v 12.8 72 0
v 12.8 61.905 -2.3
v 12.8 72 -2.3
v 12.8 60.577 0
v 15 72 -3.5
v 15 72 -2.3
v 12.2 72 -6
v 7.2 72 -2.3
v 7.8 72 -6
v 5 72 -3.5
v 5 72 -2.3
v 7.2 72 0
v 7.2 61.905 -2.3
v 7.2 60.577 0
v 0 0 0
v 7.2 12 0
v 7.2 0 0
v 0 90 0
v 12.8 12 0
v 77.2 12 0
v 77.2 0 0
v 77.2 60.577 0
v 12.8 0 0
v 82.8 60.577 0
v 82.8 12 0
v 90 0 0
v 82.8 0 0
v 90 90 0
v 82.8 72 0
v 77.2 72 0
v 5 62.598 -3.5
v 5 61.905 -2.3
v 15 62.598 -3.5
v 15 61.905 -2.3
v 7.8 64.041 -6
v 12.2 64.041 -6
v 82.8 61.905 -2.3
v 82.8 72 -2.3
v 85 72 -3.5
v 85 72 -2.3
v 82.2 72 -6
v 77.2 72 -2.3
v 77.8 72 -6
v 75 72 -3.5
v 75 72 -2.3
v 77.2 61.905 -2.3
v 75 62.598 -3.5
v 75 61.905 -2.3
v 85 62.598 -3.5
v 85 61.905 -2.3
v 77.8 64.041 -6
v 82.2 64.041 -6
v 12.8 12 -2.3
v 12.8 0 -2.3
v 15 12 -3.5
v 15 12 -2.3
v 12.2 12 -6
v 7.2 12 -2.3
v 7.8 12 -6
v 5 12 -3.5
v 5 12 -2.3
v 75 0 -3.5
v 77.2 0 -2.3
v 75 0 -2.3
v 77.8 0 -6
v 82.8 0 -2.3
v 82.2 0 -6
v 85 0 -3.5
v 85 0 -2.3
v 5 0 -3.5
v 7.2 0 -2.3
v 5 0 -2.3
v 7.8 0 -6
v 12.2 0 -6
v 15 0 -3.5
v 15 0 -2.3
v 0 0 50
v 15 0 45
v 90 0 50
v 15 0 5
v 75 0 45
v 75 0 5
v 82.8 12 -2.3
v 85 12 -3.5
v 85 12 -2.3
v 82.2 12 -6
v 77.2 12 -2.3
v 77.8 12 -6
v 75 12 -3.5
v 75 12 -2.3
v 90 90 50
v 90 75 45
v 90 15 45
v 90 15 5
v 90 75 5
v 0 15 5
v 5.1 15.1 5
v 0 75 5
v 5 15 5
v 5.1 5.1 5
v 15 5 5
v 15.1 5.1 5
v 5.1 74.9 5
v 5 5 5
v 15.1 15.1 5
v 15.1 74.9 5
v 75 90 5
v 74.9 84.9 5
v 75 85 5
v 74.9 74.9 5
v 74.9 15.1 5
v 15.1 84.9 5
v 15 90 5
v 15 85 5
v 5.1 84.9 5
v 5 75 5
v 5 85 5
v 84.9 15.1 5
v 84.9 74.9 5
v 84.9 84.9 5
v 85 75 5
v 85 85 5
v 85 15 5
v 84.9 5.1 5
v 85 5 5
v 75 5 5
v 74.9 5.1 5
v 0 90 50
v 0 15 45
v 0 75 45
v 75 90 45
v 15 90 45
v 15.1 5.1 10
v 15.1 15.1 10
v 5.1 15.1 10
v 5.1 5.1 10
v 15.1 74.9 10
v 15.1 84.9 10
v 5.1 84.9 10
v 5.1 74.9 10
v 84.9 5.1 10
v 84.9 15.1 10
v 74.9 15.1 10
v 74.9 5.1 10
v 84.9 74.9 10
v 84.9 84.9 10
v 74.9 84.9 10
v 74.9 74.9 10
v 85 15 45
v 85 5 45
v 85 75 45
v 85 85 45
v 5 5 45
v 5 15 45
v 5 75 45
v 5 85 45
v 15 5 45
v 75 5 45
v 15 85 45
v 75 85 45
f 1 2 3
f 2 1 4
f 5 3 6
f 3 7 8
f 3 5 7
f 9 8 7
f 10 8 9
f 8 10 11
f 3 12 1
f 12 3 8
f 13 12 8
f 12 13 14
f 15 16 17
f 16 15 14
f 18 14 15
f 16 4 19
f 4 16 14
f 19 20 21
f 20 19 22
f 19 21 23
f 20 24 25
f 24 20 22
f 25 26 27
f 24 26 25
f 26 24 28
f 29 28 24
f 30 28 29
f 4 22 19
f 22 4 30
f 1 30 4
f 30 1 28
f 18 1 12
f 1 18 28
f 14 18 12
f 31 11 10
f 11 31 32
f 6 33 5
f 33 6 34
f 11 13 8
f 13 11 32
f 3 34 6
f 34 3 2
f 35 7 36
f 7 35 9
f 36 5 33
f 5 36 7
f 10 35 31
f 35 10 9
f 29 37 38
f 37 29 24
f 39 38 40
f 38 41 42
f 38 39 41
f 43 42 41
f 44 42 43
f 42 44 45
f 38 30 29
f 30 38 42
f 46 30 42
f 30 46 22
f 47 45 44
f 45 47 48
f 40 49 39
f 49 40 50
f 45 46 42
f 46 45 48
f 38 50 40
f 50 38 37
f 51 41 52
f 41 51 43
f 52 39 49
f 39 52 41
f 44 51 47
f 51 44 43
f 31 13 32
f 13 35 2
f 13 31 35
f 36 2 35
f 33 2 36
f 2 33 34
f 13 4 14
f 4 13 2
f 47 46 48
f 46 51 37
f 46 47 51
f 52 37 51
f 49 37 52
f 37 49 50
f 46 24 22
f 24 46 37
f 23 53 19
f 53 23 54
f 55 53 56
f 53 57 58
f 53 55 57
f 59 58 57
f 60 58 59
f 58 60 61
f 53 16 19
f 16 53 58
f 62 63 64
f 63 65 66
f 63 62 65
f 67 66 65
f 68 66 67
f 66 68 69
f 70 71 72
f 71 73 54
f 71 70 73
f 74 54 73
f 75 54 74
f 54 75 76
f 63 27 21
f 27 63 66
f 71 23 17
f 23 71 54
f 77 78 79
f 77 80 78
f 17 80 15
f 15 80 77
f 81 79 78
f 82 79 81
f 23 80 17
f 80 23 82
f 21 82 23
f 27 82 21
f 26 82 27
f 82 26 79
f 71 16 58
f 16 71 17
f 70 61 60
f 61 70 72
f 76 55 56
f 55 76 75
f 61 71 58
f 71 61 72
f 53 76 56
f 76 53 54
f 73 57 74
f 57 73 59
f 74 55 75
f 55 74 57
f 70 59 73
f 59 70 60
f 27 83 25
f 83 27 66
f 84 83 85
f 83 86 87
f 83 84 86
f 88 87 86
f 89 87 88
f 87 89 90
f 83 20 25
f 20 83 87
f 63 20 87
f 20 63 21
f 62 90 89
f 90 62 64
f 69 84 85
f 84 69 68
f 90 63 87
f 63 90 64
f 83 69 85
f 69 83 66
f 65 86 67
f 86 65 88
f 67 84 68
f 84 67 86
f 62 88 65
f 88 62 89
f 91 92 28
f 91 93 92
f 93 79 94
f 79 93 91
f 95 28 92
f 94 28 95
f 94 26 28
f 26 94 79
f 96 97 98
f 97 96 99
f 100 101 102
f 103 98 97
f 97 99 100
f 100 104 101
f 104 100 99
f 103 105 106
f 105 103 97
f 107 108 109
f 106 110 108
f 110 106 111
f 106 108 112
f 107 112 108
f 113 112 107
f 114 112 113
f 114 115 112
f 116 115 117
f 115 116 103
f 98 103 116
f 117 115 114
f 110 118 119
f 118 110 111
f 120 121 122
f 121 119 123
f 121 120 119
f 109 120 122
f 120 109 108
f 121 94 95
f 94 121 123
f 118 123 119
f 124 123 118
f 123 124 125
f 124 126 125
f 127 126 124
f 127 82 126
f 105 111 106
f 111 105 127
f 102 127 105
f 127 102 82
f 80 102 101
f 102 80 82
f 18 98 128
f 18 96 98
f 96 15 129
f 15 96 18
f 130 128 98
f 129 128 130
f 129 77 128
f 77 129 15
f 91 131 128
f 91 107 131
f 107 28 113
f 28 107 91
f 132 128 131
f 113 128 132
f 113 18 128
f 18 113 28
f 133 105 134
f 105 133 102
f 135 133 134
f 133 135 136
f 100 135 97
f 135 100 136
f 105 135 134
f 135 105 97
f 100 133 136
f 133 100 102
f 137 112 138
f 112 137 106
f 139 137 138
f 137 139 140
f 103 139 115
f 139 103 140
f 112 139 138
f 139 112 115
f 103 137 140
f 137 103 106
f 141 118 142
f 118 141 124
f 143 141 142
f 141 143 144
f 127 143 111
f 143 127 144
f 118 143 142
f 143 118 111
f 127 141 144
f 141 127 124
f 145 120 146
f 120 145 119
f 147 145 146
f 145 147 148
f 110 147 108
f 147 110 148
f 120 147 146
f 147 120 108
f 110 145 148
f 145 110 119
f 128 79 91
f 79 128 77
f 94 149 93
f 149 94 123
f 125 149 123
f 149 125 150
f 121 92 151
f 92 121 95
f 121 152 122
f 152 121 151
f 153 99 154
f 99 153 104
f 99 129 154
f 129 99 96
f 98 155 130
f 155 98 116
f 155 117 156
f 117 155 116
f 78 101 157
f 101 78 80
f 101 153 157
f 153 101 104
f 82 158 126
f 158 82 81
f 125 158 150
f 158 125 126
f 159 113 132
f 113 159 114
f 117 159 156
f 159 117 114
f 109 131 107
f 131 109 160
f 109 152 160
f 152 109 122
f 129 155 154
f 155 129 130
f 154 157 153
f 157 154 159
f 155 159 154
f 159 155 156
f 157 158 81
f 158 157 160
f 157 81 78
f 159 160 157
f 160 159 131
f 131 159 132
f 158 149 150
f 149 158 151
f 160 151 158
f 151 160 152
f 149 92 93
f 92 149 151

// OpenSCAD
echo(version=version());
// Config
base_W = 90;
base_H = 90;
base_T = 5;

union() {
    // base board
    cube([base_W,base_H,base_T]);
    // hook for angle
    translate([5, 0, 0]) {
        difference(){
        	union() {
        		translate([0, 60, 0]) myhook();
        		translate([70, 60, 0]) myhook();
        	}
        	translate([-5, 60, -4]) rotate([60, 0, 0])  rotate([0, 90, 0]) cylinder(h=90, r=5, center=false, $fn=3);
        }
        translate([0, 0, 0]) myhook();
        translate([70, 0, 0]) myhook();
    }
    // joint of frame on board
    translate([5.1, 5.1, 5]) cube([10,10,5]);
    translate([5.1, 74.9, 5]) cube([10,10,5]);
    translate([74.9, 5.1, 5]) cube([10,10,5]);
    translate([74.9, 74.9, 5]) cube([10,10,5]);
}

union() {
    //up unit
    difference(){
        union(){
            // frame 1
            translate([0, 0, 0]) cube([15,5,50]);
            translate([75, 0, 0]) cube([15,5,50]);
            translate([0, 85, 0]) cube([15,5,50]);
            translate([75, 85, 0]) cube([15,5,50]);
            // frame 2
            translate([90, 0, 0]) {
                rotate([0, 0, 90]) translate([0, 0, 0]) cube([15,5,50]);
                rotate([0, 0, 90]) translate([75, 0, 0]) cube([15,5,50]);
                rotate([0, 0, 90]) translate([0, 85, 0]) cube([15,5,50]);
                rotate([0, 0, 90]) translate([75, 85, 0]) cube([15,5,50]);
            }
            // top board
            translate([0, 0, 45]) cube([base_W,base_H,base_T]);
        }
        // base board for difference
        cube([base_W,base_H,base_T]);
    }
}

module myhook() {
    rotate([-90, 0, 0]) union() {
        translate([(10-5.6)/2, 0, 0]) cube([5.6, 3, 12]);
        translate([0, 2.3, 0]) hull() {
            cube([10, 1.2, 12]);
            translate([(10-4.4)/2, 3.6, 0])cube([4.4, 0.1, 12]);
        }
    }
}
